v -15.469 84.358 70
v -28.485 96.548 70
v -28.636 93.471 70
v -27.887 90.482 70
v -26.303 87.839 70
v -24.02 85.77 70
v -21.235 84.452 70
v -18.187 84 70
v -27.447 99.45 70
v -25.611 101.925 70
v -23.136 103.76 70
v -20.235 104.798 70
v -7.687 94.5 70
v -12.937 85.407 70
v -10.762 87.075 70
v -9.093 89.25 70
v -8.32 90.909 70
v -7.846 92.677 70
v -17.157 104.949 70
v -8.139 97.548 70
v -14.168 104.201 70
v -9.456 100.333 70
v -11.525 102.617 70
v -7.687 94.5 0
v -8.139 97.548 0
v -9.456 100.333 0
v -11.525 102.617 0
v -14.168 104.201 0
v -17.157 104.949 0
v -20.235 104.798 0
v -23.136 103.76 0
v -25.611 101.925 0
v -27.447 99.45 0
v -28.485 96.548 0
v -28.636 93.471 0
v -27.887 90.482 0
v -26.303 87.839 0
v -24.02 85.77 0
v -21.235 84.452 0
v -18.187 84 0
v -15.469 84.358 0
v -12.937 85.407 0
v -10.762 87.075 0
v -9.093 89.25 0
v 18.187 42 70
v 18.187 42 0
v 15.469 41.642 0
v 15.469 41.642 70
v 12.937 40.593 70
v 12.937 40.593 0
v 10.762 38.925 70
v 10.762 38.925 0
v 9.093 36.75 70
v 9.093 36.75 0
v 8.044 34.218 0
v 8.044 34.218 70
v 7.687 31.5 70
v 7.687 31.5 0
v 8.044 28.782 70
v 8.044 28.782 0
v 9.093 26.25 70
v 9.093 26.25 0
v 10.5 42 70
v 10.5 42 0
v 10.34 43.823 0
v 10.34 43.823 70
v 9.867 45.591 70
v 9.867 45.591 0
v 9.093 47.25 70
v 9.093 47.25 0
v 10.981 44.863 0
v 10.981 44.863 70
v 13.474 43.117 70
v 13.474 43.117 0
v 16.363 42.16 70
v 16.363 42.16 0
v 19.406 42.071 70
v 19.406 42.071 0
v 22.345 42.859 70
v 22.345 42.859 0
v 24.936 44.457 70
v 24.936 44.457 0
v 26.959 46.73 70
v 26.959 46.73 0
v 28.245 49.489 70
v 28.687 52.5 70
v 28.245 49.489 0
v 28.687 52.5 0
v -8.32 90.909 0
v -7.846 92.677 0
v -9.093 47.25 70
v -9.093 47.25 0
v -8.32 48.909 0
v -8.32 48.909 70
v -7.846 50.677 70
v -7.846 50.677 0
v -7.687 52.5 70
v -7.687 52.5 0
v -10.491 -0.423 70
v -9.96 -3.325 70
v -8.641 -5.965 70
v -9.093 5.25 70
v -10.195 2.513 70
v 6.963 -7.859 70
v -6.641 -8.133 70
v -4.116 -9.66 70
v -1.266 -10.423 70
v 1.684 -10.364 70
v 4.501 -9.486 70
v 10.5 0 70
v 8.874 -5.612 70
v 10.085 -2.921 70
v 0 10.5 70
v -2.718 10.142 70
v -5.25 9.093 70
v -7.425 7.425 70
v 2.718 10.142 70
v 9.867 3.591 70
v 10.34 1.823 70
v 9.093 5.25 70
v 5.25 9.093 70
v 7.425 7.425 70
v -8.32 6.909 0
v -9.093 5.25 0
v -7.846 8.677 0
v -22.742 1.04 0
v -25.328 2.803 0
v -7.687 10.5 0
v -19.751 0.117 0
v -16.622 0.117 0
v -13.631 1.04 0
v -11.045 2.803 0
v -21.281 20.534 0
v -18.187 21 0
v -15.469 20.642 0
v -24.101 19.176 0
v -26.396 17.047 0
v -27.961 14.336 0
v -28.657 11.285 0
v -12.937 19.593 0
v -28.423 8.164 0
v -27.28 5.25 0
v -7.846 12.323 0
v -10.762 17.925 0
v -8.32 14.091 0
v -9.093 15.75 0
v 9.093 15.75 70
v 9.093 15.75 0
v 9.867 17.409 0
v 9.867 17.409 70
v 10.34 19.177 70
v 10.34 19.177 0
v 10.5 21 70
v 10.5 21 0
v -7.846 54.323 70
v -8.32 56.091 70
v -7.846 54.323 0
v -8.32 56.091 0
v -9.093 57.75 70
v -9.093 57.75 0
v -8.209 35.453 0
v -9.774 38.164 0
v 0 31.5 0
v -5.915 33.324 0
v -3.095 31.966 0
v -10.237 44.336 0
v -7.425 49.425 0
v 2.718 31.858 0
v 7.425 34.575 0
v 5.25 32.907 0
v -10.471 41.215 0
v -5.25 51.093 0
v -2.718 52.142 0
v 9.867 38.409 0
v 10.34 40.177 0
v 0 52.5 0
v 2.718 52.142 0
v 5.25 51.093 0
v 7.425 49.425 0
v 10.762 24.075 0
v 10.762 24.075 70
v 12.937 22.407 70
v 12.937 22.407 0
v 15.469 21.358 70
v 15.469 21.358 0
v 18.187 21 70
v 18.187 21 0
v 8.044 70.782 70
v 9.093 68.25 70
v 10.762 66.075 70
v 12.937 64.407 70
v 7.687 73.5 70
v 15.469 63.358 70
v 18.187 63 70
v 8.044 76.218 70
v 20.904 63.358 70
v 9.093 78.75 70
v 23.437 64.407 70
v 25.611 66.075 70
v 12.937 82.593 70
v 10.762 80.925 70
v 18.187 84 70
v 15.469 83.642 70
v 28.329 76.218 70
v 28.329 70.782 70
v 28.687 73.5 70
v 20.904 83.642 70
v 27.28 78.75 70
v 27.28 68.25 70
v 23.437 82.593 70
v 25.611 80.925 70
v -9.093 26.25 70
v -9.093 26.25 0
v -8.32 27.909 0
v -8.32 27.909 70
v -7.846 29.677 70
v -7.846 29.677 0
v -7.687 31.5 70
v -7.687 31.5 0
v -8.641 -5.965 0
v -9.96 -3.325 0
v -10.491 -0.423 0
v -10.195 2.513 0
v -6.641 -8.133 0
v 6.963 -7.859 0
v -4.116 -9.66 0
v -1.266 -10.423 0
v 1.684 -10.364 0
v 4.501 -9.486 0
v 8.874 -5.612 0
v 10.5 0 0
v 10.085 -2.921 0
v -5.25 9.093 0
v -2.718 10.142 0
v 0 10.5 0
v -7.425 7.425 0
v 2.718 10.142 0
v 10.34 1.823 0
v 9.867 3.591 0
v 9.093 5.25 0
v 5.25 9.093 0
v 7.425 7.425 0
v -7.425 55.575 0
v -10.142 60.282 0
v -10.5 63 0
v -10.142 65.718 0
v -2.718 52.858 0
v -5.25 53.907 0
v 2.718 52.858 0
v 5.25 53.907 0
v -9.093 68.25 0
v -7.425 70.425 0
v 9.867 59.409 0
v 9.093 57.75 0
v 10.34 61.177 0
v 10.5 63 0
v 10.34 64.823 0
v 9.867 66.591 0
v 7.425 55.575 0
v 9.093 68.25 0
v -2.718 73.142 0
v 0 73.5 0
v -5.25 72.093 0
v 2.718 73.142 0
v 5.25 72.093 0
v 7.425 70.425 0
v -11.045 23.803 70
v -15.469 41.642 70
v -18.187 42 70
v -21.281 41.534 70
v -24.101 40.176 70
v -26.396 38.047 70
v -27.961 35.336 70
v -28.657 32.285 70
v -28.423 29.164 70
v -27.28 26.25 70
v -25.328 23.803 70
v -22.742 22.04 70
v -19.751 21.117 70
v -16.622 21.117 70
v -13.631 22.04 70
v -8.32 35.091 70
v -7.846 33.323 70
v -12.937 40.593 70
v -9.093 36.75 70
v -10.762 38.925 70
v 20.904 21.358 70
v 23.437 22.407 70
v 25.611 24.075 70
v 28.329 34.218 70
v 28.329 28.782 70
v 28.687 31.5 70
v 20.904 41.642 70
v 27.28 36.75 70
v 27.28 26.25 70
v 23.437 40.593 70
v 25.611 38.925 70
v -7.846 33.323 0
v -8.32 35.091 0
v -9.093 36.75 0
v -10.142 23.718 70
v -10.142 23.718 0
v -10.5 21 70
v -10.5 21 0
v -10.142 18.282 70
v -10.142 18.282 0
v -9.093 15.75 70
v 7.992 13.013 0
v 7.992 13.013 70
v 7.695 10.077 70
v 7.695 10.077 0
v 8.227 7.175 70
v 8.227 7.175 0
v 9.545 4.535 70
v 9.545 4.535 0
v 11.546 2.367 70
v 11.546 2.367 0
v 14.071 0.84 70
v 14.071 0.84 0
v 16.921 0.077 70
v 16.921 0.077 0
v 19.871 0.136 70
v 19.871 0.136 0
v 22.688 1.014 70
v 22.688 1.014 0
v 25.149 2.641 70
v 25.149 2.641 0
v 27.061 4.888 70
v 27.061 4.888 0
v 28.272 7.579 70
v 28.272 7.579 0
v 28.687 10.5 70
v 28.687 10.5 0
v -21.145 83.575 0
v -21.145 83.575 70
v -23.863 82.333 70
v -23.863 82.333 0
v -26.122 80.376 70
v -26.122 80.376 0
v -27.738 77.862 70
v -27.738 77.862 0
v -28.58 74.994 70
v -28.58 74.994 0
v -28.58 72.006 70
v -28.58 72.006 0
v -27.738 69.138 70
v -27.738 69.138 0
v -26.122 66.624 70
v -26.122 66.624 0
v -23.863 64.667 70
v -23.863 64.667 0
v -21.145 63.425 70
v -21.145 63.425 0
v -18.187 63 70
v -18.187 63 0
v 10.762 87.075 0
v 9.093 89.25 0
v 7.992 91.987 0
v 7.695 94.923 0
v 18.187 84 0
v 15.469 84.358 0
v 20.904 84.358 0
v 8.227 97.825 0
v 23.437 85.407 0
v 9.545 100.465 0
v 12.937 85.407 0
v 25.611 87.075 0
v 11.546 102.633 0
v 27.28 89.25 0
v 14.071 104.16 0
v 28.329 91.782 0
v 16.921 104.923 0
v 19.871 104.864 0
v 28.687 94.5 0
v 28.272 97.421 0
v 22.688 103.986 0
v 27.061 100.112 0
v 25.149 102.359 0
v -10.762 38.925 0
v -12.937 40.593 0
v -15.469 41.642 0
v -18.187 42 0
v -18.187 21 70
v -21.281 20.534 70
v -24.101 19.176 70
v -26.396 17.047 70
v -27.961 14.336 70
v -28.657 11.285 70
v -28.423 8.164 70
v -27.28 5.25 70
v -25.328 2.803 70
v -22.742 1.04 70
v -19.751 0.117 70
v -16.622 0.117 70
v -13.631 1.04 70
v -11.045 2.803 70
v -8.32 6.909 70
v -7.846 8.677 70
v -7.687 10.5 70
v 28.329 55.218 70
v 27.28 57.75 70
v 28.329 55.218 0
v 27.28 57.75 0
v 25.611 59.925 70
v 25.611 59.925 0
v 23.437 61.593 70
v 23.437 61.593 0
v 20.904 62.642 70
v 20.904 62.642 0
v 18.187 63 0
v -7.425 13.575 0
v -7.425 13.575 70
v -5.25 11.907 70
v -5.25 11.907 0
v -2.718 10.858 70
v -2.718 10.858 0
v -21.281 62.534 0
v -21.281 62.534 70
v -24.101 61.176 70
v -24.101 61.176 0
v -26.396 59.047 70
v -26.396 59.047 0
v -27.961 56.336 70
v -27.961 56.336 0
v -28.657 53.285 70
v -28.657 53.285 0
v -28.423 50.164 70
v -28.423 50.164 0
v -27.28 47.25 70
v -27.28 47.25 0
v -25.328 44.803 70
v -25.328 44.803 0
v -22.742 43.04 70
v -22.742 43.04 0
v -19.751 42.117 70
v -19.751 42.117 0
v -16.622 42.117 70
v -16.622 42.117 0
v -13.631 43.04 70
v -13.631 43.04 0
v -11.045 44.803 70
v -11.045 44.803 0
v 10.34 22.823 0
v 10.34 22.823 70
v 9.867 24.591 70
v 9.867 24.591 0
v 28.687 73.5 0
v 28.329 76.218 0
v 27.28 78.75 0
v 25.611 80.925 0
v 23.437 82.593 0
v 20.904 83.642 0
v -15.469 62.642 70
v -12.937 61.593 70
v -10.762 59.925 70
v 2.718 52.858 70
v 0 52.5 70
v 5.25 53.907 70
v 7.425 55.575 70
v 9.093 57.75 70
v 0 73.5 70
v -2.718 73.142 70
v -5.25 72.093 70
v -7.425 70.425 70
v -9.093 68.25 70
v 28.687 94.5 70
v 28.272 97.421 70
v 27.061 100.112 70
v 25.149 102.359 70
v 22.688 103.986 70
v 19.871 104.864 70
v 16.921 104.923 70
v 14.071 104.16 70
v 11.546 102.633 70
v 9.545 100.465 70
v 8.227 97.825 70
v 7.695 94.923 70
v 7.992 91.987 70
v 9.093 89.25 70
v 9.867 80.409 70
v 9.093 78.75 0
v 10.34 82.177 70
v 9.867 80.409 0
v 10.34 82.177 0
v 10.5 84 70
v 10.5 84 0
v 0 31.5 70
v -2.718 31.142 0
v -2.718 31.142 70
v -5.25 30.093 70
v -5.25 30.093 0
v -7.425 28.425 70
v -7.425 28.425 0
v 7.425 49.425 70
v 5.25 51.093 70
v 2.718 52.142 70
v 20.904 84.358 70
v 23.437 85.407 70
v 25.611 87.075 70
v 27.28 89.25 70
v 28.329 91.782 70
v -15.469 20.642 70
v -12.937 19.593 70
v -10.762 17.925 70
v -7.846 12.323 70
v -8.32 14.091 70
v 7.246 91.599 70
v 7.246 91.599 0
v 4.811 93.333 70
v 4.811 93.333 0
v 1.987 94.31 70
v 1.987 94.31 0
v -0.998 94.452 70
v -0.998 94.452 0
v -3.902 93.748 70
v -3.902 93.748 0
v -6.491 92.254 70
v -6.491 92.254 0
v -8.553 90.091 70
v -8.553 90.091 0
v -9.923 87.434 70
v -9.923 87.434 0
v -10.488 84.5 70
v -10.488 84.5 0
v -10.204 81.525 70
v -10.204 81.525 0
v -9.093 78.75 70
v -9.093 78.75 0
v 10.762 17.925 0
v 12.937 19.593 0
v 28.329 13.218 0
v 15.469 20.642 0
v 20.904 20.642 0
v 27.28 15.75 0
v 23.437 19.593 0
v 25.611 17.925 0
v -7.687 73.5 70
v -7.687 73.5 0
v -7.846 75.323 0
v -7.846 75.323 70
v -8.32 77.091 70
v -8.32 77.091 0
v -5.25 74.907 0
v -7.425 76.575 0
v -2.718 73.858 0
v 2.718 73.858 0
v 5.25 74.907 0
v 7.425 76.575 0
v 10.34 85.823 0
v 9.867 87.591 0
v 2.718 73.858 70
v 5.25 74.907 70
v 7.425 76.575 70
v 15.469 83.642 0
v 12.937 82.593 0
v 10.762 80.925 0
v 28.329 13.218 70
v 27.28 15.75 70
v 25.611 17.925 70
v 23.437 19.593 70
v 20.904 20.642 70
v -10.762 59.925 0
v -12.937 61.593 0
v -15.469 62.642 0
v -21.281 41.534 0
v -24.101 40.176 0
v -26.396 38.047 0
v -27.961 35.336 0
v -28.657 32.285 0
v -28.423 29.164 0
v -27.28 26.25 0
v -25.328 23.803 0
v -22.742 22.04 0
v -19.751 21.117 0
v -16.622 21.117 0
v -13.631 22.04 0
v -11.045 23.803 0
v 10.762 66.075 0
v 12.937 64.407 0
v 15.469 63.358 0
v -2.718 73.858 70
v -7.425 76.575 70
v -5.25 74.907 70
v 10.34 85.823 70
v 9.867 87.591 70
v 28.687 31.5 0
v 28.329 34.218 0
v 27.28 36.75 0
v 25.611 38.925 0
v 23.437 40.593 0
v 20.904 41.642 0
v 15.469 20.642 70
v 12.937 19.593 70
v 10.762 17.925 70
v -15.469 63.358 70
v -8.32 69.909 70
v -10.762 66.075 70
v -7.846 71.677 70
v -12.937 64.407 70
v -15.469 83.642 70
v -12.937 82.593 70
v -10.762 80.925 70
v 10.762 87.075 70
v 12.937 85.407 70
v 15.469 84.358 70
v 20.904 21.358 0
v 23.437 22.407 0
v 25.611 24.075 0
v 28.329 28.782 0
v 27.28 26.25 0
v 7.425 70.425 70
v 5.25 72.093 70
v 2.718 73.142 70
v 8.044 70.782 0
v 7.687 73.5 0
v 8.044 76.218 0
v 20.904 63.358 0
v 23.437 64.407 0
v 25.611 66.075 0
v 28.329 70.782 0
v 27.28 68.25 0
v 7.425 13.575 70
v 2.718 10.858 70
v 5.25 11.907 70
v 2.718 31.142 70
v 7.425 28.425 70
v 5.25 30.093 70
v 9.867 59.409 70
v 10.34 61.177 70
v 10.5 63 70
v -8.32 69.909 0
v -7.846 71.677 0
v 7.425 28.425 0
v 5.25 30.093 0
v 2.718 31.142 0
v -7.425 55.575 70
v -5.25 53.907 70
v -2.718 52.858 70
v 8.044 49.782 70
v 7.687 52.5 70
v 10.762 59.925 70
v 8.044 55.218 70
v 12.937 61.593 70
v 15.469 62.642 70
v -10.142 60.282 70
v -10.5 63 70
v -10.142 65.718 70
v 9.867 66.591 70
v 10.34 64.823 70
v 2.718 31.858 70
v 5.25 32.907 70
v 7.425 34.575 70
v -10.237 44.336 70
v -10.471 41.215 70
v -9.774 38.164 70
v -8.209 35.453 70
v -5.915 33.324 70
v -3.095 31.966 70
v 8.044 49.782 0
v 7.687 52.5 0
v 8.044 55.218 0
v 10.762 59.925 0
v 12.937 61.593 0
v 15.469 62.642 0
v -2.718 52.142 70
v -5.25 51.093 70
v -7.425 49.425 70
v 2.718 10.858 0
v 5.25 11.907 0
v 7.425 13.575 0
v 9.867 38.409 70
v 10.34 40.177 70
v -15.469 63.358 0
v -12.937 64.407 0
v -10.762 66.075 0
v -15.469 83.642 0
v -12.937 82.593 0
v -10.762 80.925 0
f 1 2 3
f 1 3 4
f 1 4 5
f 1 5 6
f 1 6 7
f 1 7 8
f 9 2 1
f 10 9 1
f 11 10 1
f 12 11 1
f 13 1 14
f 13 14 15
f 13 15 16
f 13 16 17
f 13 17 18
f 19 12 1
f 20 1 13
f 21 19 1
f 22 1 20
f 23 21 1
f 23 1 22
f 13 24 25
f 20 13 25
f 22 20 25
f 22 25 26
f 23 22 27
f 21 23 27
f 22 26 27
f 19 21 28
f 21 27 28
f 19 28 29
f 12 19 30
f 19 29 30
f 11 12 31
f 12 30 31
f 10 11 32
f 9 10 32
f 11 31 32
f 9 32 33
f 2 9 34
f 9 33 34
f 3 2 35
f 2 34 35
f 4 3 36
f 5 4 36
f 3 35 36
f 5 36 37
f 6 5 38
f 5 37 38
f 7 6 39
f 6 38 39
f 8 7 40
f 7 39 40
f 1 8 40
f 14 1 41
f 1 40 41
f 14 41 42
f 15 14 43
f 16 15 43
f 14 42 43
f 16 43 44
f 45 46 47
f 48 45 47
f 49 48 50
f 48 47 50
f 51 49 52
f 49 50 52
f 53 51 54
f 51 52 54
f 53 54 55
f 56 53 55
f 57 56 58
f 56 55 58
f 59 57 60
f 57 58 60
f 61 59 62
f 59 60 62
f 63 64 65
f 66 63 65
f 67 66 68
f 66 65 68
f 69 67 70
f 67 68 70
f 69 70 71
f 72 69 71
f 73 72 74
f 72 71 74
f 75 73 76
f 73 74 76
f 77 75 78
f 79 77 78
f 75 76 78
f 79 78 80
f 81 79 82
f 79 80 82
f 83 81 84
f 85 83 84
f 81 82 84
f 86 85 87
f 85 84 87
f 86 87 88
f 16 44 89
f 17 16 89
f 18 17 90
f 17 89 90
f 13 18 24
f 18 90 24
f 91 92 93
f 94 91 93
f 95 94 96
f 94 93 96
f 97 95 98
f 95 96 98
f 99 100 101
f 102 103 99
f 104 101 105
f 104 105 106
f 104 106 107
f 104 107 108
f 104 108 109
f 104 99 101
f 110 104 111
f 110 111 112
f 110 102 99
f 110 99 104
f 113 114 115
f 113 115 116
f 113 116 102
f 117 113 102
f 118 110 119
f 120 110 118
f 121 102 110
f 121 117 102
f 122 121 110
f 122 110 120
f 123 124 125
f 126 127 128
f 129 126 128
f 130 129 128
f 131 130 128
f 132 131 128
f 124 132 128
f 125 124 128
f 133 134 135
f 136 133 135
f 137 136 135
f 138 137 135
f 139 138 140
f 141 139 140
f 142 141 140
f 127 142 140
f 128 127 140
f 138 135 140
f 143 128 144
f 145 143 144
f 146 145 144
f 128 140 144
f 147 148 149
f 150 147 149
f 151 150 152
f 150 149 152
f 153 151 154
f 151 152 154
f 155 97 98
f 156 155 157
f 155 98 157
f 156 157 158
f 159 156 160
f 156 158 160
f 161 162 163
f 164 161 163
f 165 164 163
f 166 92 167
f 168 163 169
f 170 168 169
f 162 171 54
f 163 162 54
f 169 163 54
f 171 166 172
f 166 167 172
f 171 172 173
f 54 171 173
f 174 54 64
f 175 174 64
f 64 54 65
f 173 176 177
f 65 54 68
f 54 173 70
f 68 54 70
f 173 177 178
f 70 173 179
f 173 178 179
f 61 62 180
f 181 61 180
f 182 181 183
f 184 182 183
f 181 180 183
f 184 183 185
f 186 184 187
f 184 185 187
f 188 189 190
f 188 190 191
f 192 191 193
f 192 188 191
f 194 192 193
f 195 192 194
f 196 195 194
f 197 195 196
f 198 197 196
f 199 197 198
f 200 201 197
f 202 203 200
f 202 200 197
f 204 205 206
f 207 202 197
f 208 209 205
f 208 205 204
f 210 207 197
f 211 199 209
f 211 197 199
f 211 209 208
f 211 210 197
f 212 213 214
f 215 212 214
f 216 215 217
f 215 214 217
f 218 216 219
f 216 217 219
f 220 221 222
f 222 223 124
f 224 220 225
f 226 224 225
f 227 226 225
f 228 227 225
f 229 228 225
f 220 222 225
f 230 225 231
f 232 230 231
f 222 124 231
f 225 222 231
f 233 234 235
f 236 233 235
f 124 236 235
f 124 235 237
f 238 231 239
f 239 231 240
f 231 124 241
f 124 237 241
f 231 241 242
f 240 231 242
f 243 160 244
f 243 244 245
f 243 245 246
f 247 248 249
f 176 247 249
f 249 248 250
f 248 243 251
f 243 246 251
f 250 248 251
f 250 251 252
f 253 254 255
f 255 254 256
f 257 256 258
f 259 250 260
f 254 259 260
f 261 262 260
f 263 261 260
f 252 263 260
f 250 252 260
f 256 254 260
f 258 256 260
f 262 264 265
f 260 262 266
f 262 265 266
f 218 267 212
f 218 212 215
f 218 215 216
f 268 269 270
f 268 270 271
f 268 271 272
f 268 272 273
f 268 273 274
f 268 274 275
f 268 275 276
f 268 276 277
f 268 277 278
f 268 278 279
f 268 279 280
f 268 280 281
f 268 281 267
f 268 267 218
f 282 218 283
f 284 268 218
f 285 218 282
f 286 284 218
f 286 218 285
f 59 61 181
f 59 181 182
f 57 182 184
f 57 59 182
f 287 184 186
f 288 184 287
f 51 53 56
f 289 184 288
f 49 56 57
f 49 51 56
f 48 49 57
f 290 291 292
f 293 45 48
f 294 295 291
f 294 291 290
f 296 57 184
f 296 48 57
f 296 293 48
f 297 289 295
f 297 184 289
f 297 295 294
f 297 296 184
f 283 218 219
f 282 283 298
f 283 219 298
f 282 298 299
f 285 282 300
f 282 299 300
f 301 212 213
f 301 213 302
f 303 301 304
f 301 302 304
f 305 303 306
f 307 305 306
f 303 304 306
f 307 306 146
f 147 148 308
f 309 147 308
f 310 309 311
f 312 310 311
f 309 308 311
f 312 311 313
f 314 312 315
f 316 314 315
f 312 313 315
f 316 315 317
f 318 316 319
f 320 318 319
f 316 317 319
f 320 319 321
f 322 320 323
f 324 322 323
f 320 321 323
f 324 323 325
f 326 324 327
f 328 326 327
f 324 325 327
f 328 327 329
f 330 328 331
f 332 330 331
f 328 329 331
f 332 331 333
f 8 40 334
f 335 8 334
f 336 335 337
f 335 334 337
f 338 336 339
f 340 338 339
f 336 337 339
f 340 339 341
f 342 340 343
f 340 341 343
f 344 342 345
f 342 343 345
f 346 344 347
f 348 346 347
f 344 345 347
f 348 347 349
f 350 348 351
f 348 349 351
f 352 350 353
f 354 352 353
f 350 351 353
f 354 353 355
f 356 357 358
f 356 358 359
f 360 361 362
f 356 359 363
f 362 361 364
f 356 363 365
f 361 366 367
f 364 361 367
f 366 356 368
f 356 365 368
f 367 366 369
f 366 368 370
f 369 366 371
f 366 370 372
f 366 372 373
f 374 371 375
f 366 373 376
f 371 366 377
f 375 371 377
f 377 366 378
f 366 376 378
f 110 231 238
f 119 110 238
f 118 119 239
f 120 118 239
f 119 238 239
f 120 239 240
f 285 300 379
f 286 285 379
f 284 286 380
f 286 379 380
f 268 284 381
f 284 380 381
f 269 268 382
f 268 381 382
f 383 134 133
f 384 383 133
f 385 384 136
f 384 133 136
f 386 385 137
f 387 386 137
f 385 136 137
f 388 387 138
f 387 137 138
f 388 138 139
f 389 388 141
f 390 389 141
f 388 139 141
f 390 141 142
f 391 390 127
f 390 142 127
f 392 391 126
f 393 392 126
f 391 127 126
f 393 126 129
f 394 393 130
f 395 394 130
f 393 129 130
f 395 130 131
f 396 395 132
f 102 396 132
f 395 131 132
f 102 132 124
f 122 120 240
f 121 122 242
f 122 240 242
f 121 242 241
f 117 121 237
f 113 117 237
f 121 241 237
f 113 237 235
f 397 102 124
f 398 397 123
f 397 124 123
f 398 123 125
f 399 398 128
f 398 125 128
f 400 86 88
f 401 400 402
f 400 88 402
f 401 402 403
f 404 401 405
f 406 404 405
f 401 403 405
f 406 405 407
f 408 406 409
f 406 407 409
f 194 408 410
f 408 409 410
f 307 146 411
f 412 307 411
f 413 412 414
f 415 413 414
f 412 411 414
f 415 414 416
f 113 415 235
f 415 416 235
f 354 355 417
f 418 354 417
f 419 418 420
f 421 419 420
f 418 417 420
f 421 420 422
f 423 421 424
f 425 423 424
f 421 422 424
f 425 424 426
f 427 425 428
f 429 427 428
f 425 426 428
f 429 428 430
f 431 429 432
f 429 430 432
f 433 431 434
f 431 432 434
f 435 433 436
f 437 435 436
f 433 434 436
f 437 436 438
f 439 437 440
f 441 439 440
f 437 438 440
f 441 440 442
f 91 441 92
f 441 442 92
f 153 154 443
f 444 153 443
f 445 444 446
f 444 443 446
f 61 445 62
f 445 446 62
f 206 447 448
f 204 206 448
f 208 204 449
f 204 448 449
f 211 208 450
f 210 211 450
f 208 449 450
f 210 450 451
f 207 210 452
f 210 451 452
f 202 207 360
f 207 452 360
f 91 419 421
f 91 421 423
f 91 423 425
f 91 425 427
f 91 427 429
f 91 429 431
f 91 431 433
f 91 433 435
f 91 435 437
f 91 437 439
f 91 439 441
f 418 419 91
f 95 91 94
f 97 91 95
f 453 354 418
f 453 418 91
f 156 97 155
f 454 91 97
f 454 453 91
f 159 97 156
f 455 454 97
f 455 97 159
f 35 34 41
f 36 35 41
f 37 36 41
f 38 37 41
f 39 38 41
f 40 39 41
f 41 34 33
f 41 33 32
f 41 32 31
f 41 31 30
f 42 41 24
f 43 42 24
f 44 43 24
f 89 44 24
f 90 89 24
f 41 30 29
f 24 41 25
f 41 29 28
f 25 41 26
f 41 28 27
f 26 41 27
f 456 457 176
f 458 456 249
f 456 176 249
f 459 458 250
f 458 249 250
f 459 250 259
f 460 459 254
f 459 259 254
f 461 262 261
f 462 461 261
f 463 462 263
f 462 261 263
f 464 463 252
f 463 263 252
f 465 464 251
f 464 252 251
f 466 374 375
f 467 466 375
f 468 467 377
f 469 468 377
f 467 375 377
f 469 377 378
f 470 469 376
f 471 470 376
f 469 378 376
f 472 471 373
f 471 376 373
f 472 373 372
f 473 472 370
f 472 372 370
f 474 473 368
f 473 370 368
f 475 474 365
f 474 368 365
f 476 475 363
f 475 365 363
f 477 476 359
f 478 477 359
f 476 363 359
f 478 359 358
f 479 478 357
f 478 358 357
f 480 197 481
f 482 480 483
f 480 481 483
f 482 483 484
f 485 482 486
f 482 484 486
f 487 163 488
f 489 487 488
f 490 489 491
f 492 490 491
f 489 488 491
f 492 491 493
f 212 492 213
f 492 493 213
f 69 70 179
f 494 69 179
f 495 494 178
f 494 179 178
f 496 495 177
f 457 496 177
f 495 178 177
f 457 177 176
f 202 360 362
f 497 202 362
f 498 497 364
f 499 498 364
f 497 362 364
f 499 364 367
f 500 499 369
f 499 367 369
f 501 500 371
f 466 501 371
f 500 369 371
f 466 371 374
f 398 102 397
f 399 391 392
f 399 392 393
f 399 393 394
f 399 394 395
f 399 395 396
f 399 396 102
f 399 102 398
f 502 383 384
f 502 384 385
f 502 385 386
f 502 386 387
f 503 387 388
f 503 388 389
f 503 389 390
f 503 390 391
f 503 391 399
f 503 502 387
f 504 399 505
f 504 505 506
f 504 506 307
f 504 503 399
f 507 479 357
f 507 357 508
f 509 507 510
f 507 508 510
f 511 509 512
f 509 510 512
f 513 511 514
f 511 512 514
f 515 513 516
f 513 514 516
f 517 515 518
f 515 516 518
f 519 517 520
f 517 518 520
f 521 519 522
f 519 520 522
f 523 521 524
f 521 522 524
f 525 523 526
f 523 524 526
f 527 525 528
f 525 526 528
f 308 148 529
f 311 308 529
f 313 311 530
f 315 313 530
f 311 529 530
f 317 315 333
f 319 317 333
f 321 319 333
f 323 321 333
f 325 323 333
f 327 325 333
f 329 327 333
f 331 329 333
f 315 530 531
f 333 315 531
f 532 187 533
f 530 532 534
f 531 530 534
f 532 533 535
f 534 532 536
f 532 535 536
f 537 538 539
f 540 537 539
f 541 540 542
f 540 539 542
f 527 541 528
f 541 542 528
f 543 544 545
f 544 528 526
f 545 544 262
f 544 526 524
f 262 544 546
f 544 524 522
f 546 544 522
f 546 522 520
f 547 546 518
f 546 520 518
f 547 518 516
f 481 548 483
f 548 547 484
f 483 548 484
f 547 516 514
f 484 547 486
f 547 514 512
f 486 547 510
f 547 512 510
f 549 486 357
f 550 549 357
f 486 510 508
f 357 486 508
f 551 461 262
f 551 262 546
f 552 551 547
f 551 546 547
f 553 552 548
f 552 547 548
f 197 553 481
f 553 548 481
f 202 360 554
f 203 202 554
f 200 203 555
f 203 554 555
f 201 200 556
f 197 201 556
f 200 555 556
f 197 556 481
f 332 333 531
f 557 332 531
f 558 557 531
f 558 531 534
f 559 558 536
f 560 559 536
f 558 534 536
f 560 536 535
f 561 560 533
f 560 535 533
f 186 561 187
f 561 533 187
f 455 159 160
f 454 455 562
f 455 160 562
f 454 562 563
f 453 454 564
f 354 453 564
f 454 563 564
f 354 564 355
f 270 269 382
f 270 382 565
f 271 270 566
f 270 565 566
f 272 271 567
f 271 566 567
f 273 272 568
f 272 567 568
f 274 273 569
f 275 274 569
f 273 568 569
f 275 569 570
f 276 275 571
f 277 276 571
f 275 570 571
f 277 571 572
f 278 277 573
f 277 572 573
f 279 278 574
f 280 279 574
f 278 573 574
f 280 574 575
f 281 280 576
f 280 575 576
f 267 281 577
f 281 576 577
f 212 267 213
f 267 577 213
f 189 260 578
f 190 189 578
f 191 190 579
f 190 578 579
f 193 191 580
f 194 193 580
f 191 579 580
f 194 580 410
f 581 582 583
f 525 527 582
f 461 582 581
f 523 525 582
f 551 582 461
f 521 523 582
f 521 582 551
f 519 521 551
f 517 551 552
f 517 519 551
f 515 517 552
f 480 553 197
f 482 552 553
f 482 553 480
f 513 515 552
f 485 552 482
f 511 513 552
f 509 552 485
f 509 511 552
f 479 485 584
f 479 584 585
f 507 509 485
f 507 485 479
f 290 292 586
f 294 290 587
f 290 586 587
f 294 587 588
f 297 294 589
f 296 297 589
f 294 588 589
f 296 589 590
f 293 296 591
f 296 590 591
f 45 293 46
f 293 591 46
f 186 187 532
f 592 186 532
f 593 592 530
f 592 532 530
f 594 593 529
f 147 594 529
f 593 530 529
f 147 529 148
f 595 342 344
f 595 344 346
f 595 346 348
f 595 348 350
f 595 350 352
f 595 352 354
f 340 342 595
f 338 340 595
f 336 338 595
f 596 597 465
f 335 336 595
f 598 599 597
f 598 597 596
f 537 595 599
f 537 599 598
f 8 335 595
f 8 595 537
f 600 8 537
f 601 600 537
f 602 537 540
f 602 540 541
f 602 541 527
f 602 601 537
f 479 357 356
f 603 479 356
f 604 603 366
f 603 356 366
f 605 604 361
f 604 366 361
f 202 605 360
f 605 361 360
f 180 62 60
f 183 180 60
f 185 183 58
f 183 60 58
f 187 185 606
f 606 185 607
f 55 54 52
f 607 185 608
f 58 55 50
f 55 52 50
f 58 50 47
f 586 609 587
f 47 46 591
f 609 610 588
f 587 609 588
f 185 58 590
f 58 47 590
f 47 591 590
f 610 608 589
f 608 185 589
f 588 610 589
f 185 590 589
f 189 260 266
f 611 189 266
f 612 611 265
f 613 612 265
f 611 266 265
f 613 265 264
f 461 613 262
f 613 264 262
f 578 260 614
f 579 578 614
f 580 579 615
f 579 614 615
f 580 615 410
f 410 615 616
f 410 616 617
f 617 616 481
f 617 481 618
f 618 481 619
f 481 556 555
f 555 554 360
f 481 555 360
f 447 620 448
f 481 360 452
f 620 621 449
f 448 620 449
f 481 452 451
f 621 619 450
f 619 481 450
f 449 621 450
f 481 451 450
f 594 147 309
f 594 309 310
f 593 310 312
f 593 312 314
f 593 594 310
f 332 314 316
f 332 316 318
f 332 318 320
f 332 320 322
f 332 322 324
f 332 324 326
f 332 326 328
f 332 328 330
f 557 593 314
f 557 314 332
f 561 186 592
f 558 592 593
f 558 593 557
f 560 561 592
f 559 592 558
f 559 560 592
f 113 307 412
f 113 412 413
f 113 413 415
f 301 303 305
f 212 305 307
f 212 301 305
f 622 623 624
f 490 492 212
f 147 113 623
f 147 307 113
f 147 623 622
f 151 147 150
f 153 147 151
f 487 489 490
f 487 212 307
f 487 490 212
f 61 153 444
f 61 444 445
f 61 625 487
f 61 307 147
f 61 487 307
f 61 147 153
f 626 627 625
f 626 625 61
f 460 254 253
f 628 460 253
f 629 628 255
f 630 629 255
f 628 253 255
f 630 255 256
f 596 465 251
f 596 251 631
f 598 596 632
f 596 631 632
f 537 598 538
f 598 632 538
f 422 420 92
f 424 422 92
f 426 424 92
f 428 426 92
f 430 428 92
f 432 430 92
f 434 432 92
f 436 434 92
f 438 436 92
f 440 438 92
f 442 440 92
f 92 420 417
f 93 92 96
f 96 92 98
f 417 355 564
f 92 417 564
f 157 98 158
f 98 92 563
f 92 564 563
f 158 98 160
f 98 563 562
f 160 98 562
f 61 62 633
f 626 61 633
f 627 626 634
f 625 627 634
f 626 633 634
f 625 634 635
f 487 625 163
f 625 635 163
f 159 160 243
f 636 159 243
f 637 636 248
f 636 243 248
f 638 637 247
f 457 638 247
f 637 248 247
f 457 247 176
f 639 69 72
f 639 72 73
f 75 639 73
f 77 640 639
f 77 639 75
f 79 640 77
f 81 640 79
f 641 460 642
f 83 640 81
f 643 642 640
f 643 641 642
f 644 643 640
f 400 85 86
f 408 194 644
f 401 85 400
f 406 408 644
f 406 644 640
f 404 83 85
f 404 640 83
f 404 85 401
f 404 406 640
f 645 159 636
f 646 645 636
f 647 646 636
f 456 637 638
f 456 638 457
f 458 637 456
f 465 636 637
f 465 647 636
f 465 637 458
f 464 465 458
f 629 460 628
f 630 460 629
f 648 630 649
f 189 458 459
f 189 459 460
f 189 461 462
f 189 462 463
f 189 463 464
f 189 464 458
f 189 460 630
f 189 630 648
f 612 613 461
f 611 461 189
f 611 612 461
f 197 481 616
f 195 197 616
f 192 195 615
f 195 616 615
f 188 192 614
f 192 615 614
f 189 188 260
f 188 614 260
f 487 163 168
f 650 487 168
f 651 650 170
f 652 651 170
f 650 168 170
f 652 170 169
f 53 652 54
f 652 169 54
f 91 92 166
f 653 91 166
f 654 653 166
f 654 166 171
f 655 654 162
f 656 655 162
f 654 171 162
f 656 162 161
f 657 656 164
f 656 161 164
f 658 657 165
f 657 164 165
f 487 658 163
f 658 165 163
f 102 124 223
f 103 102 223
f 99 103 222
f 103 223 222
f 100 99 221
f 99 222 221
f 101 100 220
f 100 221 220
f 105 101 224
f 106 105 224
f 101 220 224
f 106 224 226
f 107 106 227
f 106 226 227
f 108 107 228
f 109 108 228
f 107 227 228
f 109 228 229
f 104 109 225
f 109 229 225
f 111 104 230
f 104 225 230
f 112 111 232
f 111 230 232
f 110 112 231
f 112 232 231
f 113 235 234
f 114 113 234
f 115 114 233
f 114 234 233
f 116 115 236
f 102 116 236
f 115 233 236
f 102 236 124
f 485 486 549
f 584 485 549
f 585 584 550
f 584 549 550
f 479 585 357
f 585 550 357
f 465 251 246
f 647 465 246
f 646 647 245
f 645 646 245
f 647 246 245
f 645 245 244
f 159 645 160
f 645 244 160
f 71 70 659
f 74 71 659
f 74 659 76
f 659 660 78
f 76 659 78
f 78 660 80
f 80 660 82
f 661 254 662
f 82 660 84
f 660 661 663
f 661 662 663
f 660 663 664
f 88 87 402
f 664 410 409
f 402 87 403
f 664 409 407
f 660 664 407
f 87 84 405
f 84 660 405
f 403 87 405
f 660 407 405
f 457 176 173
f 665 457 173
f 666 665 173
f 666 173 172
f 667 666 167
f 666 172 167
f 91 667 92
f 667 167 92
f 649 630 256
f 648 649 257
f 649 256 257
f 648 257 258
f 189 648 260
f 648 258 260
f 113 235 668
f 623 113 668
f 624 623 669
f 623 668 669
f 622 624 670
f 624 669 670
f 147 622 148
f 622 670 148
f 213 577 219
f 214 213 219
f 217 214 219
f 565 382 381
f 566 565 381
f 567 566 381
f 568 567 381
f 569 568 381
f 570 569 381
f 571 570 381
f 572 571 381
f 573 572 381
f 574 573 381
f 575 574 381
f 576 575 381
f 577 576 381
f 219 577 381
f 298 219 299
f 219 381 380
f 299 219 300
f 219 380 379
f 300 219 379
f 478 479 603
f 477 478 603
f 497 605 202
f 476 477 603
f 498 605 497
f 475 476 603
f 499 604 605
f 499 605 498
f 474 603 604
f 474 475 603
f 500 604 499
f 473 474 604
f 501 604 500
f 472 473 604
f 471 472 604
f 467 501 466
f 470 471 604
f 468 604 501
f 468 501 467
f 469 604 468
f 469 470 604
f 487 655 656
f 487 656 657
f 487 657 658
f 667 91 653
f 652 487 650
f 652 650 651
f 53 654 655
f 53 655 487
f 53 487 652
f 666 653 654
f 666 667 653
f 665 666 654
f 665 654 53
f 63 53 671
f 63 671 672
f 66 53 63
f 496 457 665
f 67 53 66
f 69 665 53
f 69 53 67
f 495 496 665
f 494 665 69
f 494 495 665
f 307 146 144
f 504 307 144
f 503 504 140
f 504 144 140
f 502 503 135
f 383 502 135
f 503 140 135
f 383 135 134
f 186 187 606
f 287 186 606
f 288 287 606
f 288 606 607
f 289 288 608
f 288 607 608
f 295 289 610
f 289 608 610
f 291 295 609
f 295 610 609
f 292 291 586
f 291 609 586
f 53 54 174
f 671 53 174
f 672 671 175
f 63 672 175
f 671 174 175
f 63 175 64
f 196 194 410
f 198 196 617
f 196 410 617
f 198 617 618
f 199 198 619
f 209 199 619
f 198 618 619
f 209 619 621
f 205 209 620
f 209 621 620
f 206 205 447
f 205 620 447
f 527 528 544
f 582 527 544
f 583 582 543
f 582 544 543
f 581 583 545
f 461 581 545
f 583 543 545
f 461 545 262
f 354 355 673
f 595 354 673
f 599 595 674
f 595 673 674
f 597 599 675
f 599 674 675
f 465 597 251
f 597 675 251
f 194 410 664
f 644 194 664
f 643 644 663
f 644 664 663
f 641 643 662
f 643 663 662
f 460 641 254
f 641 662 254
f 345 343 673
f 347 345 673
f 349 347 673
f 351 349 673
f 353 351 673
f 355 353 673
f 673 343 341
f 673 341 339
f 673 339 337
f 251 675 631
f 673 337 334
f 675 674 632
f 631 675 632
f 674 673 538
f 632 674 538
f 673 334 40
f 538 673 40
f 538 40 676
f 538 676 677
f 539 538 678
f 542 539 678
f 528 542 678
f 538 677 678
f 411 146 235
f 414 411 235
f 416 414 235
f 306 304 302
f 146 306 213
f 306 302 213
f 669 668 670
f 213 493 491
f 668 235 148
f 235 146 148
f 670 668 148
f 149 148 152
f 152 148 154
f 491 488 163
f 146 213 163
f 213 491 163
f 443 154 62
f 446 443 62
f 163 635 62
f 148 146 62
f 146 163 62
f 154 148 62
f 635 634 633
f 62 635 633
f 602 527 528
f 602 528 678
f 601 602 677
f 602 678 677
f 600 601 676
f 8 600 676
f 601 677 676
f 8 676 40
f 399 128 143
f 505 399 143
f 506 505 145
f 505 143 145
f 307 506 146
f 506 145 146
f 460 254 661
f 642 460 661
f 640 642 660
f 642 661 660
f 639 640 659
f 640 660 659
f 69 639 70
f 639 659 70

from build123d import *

# Parameters (mm, degrees)
F1_DEPTH = 70


# Not quite as in the source:
# - a feature names something its author has since deleted; it is built from what else it names


with BuildPart() as f1:
    # F0 (on Top) → F1 (new body)
    with BuildSketch(Plane.XY):
        with BuildLine():
            ThreePointArc((-9.0932666667, 5.2500001264), (-2.7176000441, -10.1422211571), (10.5, 0))
            ThreePointArc((10.5, 0), (10.1422211824, 2.71759995), (9.0932667642, 5.2499999577))
            ThreePointArc((9.0932667642, 5.2499999577), (5.2500000295, 9.0932667227), (1.93e-08, 10.5))
            ThreePointArc((1.93e-08, 10.5), (-5.2499999284, 9.0932667811), (-9.0932666667, 5.2500001264))
        make_face()
    extrude(amount=F1_DEPTH)


with BuildPart() as f1b:
    # F0 (on Top) → F1, piece 2 (new body)
    with BuildSketch(Plane.XY):
        with BuildLine():
            ThreePointArc((9.0932667504, 15.7500000185), (7.6865334795, 10.4999999862), (9.0932667642, 5.2499999577))
            ThreePointArc((9.0932667642, 5.2499999577), (20.9041334767, 0.3577788303), (28.6865334795, 10.5))
            ThreePointArc((28.6865334795, 10.5), (25.6111546956, 17.9246211888), (18.1865335182, 21))
            ThreePointArc((18.1865335182, 21), (12.9365335055, 19.5932667547), (9.0932667504, 15.7500000185))
        make_face()
    extrude(amount=F1_DEPTH)


with BuildPart() as f1c:
    # F0 (on Top) → F1, piece 3 (new body)
    with BuildSketch(Plane.XY):
        with BuildLine():
            ThreePointArc((-18.1865334408, 21), (-27.2798001924, 5.2499999535), (-9.0932666667, 5.2500001264))
            ThreePointArc((-9.0932666667, 5.2500001264), (-8.0443122845, 7.7824000969), (-7.6865334795, 10.5))
            ThreePointArc((-7.6865334795, 10.5), (-8.0443122981, 13.2175999536), (-9.0932667191, 15.7499999643))
            ThreePointArc((-9.0932667191, 15.7499999643), (-12.9365334449, 19.5932667197), (-18.1865334408, 21))
        make_face()
    extrude(amount=F1_DEPTH)


with BuildPart() as f1d:
    # F0 (on Top) → F1, piece 4 (new body)
    with BuildSketch(Plane.XY):
        with BuildLine():
            ThreePointArc((-9.0932667191, 15.7499999643), (-5.2499999738, 11.9067332451), (1.93e-08, 10.5))
            ThreePointArc((1.93e-08, 10.5), (5.2500000176, 11.9067332704), (9.0932667504, 15.7500000185))
            ThreePointArc((9.0932667504, 15.7500000185), (10.1422211788, 18.2824000367), (10.5, 21))
            ThreePointArc((10.5, 21), (10.1422211707, 23.7175999935), (9.0932667191, 26.2500000357))
            ThreePointArc((9.0932667191, 26.2500000357), (5.2499999989, 30.0932667404), (3.87e-08, 31.5))
            ThreePointArc((3.87e-08, 31.5), (-5.2500000363, 30.0932667188), (-9.093266801, 26.2499998939))
            ThreePointArc((-9.093266801, 26.2499998939), (-10.5, 20.9999999181), (-9.0932667191, 15.7499999643))
        make_face()
    extrude(amount=F1_DEPTH)


with BuildPart() as f1e:
    # F0 (on Top) → F1, piece 5 (new body)
    with BuildSketch(Plane.XY):
        with BuildLine():
            ThreePointArc((-18.1865333975, 42), (-28.6865334795, 31.5000000216), (-18.1865334408, 21))
            ThreePointArc((-18.1865334408, 21), (-12.9365335158, 22.4067332393), (-9.093266801, 26.2499998939))
            ThreePointArc((-9.093266801, 26.2499998939), (-8.0443123193, 28.7823999672), (-7.6865334795, 31.5))
            ThreePointArc((-7.6865334795, 31.5), (-8.0443123193, 34.2176000328), (-9.093266801, 36.7500001061))
            ThreePointArc((-9.093266801, 36.7500001061), (-12.9365334971, 40.5932667499), (-18.1865333975, 42))
        make_face()
    extrude(amount=F1_DEPTH)


with BuildPart() as f1f:
    # F0 (on Top) → F1, piece 6 (new body)
    with BuildSketch(Plane.XY):
        with BuildLine():
            ThreePointArc((9.0932667191, 26.2500000357), (12.9365334784, 22.4067332609), (18.1865335182, 21))
            ThreePointArc((18.1865335182, 21), (25.6111546956, 24.0753788112), (28.6865334795, 31.5))
            ThreePointArc((28.6865334795, 31.5), (25.6111547109, 38.9246211735), (18.1865335614, 42))
            ThreePointArc((18.1865335614, 42), (12.9365334971, 40.5932667499), (9.0932667191, 36.7499999643))
            ThreePointArc((9.0932667191, 36.7499999643), (7.6865334795, 31.5), (9.0932667191, 26.2500000357))
        make_face()
    extrude(amount=F1_DEPTH)


with BuildPart() as f1g:
    # F0 (on Top) → F1, piece 7 (new body)
    with BuildSketch(Plane.XY):
        with BuildLine():
            ThreePointArc((-18.1865333975, 63), (-28.6865334795, 52.5), (-18.1865333975, 42))
            ThreePointArc((-18.1865333975, 42), (-12.9365334907, 43.4067332538), (-9.0932667937, 47.2499999066))
            ThreePointArc((-9.0932667937, 47.2499999066), (-8.0443123174, 49.7823999743), (-7.6865334795, 52.5))
            ThreePointArc((-7.6865334795, 52.5), (-8.0443123193, 55.2176000328), (-9.093266801, 57.7500001061))
            ThreePointArc((-9.093266801, 57.7500001061), (-12.9365334971, 61.5932667499), (-18.1865333975, 63))
        make_face()
    extrude(amount=F1_DEPTH)


with BuildPart() as f1h:
    # F0 (on Top) → F1, piece 8 (new body)
    with BuildSketch(Plane.XY):
        with BuildLine():
            ThreePointArc((-9.0932667937, 47.2499999066), (-10.5, 42.0000000074), (-9.093266801, 36.7500001061))
            ThreePointArc((-9.093266801, 36.7500001061), (-5.2500000363, 32.9067332812), (3.87e-08, 31.5))
            ThreePointArc((3.87e-08, 31.5), (5.2499999989, 32.9067332596), (9.0932667191, 36.7499999643))
            ThreePointArc((9.0932667191, 36.7499999643), (10.1422211707, 39.2824000065), (10.5, 42))
            ThreePointArc((10.5, 42), (10.1422211838, 44.7175999446), (9.0932667697, 47.2499999481))
            ThreePointArc((9.0932667697, 47.2499999481), (5.2500000697, 51.0932666995), (1.009e-07, 52.5))
            ThreePointArc((1.009e-07, 52.5), (-5.250000003, 51.093266738), (-9.0932667937, 47.2499999066))
        make_face()
    extrude(amount=F1_DEPTH)


with BuildPart() as f1i:
    # F0 (on Top) → F1, piece 9 (new body)
    with BuildSketch(Plane.XY):
        with BuildLine():
            ThreePointArc((-18.1865333708, 84), (-28.6865334795, 73.5000000134), (-18.1865333975, 63))
            ThreePointArc((-18.1865333975, 63), (-12.9365334261, 64.4067332911), (-9.0932667191, 68.2500000357))
            ThreePointArc((-9.0932667191, 68.2500000357), (-8.0443122981, 70.7824000464), (-7.6865334795, 73.5))
            ThreePointArc((-7.6865334795, 73.5), (-8.0443122842, 76.2175999018), (-9.0932666654, 78.7499998713))
            ThreePointArc((-9.0932666654, 78.7499998713), (-12.936533368, 82.5932666754), (-18.1865333708, 84))
        make_face()
    extrude(amount=F1_DEPTH)


with BuildPart() as f1j:
    # F0 (on Top) → F1, piece 10 (new body)
    with BuildSketch(Plane.XY):
        with BuildLine():
            ThreePointArc((9.0932667697, 47.2499999481), (12.9365335409, 43.4067332248), (18.1865335614, 42))
            ThreePointArc((18.1865335614, 42), (25.6111547109, 45.0753788265), (28.6865334795, 52.5))
            ThreePointArc((28.6865334795, 52.5), (25.6111547109, 59.9246211735), (18.1865335614, 63))
            ThreePointArc((18.1865335614, 63), (12.9365334971, 61.5932667499), (9.0932667191, 57.7499999643))
            ThreePointArc((9.0932667191, 57.7499999643), (7.6865334795, 52.4999999494), (9.0932667697, 47.2499999481))
        make_face()
    extrude(amount=F1_DEPTH)


with BuildPart() as f1k:
    # F0 (on Top) → F1, piece 11 (new body)
    with BuildSketch(Plane.XY):
        with BuildLine():
            ThreePointArc((-9.0932667191, 68.2500000357), (-10.5, 63.0000000819), (-9.093266801, 57.7500001061))
            ThreePointArc((-9.093266801, 57.7500001061), (-5.2500000094, 53.9067332657), (1.009e-07, 52.5))
            ThreePointArc((1.009e-07, 52.5), (5.2500000258, 53.9067332752), (9.0932667191, 57.7499999643))
            ThreePointArc((9.0932667191, 57.7499999643), (10.1422211707, 60.2824000065), (10.5, 63))
            ThreePointArc((10.5, 63), (10.1422211953, 65.7175999018), (9.093266814, 68.2499998713))
            ThreePointArc((9.093266814, 68.2499998713), (5.249999985, 72.0932667484), (-1.832e-07, 73.5))
            ThreePointArc((-1.832e-07, 73.5), (-5.2500000615, 72.0932667042), (-9.0932667191, 68.2500000357))
        make_face()
    extrude(amount=F1_DEPTH)


with BuildPart() as f1l:
    # F0 (on Top) → F1, piece 12 (new body)
    with BuildSketch(Plane.XY):
        with BuildLine():
            ThreePointArc((-7.6865334795, 94.5), (-25.6111547204, 101.924621164), (-18.1865333708, 84))
            ThreePointArc((-18.1865333708, 84), (-12.9365334855, 85.4067332568), (-9.093266801, 89.2499998939))
            ThreePointArc((-9.093266801, 89.2499998939), (-8.0443123193, 91.7823999672), (-7.6865334795, 94.5))
        make_face()
    extrude(amount=F1_DEPTH)


with BuildPart() as f1m:
    # F0 (on Top) → F1, piece 13 (new body)
    with BuildSketch(Plane.XY):
        with BuildLine():
            ThreePointArc((-9.093266801, 89.2499998939), (-10.5, 83.9999998644), (-9.0932666654, 78.7499998713))
            ThreePointArc((-9.0932666654, 78.7499998713), (-5.250000015, 74.9067332689), (-1.832e-07, 73.5))
            ThreePointArc((-1.832e-07, 73.5), (5.2499999385, 74.9067332248), (9.0932667604, 78.7500000357))
            ThreePointArc((9.0932667604, 78.7500000357), (10.1422211814, 81.2824000464), (10.5, 84))
            ThreePointArc((10.5, 84), (10.1422211739, 86.7175999816), (9.0932667315, 89.2500000143))
            ThreePointArc((9.0932667315, 89.2500000143), (-6.95e-08, 94.5), (-9.093266801, 89.2499998939))
        make_face()
    extrude(amount=F1_DEPTH)


with BuildPart() as f1n:
    # F0 (on Top) → F1, piece 14 (new body)
    with BuildSketch(Plane.XY):
        with BuildLine():
            ThreePointArc((9.093266814, 68.2499998713), (12.9365335793, 64.4067332026), (18.1865335614, 63))
            ThreePointArc((18.1865335614, 63), (25.6111547109, 66.0753788265), (28.6865334795, 73.5))
            ThreePointArc((28.6865334795, 73.5), (25.6111547119, 80.9246211725), (18.1865335643, 84))
            ThreePointArc((18.1865335643, 84), (12.9365335341, 82.5932667713), (9.0932667604, 78.7500000357))
            ThreePointArc((9.0932667604, 78.7500000357), (7.6865334795, 73.4999999463), (9.093266814, 68.2499998713))
        make_face()
    extrude(amount=F1_DEPTH)


with BuildPart() as f1o:
    # F0 (on Top) → F1, piece 15 (new body)
    with BuildSketch(Plane.XY):
        with BuildLine():
            ThreePointArc((28.6865334795, 94.5), (15.4689335139, 104.6422211782), (9.0932667315, 89.2500000143))
            ThreePointArc((9.0932667315, 89.2500000143), (12.9365335091, 85.4067332432), (18.1865335643, 84))
            ThreePointArc((18.1865335643, 84), (25.6111547119, 87.0753788275), (28.6865334795, 94.5))
        make_face()
    extrude(amount=F1_DEPTH)


solid = Compound([f1.part, f1b.part, f1c.part, f1d.part, f1e.part, f1f.part, f1g.part, f1h.part, f1i.part, f1j.part, f1k.part, f1l.part, f1m.part, f1n.part, f1o.part])
